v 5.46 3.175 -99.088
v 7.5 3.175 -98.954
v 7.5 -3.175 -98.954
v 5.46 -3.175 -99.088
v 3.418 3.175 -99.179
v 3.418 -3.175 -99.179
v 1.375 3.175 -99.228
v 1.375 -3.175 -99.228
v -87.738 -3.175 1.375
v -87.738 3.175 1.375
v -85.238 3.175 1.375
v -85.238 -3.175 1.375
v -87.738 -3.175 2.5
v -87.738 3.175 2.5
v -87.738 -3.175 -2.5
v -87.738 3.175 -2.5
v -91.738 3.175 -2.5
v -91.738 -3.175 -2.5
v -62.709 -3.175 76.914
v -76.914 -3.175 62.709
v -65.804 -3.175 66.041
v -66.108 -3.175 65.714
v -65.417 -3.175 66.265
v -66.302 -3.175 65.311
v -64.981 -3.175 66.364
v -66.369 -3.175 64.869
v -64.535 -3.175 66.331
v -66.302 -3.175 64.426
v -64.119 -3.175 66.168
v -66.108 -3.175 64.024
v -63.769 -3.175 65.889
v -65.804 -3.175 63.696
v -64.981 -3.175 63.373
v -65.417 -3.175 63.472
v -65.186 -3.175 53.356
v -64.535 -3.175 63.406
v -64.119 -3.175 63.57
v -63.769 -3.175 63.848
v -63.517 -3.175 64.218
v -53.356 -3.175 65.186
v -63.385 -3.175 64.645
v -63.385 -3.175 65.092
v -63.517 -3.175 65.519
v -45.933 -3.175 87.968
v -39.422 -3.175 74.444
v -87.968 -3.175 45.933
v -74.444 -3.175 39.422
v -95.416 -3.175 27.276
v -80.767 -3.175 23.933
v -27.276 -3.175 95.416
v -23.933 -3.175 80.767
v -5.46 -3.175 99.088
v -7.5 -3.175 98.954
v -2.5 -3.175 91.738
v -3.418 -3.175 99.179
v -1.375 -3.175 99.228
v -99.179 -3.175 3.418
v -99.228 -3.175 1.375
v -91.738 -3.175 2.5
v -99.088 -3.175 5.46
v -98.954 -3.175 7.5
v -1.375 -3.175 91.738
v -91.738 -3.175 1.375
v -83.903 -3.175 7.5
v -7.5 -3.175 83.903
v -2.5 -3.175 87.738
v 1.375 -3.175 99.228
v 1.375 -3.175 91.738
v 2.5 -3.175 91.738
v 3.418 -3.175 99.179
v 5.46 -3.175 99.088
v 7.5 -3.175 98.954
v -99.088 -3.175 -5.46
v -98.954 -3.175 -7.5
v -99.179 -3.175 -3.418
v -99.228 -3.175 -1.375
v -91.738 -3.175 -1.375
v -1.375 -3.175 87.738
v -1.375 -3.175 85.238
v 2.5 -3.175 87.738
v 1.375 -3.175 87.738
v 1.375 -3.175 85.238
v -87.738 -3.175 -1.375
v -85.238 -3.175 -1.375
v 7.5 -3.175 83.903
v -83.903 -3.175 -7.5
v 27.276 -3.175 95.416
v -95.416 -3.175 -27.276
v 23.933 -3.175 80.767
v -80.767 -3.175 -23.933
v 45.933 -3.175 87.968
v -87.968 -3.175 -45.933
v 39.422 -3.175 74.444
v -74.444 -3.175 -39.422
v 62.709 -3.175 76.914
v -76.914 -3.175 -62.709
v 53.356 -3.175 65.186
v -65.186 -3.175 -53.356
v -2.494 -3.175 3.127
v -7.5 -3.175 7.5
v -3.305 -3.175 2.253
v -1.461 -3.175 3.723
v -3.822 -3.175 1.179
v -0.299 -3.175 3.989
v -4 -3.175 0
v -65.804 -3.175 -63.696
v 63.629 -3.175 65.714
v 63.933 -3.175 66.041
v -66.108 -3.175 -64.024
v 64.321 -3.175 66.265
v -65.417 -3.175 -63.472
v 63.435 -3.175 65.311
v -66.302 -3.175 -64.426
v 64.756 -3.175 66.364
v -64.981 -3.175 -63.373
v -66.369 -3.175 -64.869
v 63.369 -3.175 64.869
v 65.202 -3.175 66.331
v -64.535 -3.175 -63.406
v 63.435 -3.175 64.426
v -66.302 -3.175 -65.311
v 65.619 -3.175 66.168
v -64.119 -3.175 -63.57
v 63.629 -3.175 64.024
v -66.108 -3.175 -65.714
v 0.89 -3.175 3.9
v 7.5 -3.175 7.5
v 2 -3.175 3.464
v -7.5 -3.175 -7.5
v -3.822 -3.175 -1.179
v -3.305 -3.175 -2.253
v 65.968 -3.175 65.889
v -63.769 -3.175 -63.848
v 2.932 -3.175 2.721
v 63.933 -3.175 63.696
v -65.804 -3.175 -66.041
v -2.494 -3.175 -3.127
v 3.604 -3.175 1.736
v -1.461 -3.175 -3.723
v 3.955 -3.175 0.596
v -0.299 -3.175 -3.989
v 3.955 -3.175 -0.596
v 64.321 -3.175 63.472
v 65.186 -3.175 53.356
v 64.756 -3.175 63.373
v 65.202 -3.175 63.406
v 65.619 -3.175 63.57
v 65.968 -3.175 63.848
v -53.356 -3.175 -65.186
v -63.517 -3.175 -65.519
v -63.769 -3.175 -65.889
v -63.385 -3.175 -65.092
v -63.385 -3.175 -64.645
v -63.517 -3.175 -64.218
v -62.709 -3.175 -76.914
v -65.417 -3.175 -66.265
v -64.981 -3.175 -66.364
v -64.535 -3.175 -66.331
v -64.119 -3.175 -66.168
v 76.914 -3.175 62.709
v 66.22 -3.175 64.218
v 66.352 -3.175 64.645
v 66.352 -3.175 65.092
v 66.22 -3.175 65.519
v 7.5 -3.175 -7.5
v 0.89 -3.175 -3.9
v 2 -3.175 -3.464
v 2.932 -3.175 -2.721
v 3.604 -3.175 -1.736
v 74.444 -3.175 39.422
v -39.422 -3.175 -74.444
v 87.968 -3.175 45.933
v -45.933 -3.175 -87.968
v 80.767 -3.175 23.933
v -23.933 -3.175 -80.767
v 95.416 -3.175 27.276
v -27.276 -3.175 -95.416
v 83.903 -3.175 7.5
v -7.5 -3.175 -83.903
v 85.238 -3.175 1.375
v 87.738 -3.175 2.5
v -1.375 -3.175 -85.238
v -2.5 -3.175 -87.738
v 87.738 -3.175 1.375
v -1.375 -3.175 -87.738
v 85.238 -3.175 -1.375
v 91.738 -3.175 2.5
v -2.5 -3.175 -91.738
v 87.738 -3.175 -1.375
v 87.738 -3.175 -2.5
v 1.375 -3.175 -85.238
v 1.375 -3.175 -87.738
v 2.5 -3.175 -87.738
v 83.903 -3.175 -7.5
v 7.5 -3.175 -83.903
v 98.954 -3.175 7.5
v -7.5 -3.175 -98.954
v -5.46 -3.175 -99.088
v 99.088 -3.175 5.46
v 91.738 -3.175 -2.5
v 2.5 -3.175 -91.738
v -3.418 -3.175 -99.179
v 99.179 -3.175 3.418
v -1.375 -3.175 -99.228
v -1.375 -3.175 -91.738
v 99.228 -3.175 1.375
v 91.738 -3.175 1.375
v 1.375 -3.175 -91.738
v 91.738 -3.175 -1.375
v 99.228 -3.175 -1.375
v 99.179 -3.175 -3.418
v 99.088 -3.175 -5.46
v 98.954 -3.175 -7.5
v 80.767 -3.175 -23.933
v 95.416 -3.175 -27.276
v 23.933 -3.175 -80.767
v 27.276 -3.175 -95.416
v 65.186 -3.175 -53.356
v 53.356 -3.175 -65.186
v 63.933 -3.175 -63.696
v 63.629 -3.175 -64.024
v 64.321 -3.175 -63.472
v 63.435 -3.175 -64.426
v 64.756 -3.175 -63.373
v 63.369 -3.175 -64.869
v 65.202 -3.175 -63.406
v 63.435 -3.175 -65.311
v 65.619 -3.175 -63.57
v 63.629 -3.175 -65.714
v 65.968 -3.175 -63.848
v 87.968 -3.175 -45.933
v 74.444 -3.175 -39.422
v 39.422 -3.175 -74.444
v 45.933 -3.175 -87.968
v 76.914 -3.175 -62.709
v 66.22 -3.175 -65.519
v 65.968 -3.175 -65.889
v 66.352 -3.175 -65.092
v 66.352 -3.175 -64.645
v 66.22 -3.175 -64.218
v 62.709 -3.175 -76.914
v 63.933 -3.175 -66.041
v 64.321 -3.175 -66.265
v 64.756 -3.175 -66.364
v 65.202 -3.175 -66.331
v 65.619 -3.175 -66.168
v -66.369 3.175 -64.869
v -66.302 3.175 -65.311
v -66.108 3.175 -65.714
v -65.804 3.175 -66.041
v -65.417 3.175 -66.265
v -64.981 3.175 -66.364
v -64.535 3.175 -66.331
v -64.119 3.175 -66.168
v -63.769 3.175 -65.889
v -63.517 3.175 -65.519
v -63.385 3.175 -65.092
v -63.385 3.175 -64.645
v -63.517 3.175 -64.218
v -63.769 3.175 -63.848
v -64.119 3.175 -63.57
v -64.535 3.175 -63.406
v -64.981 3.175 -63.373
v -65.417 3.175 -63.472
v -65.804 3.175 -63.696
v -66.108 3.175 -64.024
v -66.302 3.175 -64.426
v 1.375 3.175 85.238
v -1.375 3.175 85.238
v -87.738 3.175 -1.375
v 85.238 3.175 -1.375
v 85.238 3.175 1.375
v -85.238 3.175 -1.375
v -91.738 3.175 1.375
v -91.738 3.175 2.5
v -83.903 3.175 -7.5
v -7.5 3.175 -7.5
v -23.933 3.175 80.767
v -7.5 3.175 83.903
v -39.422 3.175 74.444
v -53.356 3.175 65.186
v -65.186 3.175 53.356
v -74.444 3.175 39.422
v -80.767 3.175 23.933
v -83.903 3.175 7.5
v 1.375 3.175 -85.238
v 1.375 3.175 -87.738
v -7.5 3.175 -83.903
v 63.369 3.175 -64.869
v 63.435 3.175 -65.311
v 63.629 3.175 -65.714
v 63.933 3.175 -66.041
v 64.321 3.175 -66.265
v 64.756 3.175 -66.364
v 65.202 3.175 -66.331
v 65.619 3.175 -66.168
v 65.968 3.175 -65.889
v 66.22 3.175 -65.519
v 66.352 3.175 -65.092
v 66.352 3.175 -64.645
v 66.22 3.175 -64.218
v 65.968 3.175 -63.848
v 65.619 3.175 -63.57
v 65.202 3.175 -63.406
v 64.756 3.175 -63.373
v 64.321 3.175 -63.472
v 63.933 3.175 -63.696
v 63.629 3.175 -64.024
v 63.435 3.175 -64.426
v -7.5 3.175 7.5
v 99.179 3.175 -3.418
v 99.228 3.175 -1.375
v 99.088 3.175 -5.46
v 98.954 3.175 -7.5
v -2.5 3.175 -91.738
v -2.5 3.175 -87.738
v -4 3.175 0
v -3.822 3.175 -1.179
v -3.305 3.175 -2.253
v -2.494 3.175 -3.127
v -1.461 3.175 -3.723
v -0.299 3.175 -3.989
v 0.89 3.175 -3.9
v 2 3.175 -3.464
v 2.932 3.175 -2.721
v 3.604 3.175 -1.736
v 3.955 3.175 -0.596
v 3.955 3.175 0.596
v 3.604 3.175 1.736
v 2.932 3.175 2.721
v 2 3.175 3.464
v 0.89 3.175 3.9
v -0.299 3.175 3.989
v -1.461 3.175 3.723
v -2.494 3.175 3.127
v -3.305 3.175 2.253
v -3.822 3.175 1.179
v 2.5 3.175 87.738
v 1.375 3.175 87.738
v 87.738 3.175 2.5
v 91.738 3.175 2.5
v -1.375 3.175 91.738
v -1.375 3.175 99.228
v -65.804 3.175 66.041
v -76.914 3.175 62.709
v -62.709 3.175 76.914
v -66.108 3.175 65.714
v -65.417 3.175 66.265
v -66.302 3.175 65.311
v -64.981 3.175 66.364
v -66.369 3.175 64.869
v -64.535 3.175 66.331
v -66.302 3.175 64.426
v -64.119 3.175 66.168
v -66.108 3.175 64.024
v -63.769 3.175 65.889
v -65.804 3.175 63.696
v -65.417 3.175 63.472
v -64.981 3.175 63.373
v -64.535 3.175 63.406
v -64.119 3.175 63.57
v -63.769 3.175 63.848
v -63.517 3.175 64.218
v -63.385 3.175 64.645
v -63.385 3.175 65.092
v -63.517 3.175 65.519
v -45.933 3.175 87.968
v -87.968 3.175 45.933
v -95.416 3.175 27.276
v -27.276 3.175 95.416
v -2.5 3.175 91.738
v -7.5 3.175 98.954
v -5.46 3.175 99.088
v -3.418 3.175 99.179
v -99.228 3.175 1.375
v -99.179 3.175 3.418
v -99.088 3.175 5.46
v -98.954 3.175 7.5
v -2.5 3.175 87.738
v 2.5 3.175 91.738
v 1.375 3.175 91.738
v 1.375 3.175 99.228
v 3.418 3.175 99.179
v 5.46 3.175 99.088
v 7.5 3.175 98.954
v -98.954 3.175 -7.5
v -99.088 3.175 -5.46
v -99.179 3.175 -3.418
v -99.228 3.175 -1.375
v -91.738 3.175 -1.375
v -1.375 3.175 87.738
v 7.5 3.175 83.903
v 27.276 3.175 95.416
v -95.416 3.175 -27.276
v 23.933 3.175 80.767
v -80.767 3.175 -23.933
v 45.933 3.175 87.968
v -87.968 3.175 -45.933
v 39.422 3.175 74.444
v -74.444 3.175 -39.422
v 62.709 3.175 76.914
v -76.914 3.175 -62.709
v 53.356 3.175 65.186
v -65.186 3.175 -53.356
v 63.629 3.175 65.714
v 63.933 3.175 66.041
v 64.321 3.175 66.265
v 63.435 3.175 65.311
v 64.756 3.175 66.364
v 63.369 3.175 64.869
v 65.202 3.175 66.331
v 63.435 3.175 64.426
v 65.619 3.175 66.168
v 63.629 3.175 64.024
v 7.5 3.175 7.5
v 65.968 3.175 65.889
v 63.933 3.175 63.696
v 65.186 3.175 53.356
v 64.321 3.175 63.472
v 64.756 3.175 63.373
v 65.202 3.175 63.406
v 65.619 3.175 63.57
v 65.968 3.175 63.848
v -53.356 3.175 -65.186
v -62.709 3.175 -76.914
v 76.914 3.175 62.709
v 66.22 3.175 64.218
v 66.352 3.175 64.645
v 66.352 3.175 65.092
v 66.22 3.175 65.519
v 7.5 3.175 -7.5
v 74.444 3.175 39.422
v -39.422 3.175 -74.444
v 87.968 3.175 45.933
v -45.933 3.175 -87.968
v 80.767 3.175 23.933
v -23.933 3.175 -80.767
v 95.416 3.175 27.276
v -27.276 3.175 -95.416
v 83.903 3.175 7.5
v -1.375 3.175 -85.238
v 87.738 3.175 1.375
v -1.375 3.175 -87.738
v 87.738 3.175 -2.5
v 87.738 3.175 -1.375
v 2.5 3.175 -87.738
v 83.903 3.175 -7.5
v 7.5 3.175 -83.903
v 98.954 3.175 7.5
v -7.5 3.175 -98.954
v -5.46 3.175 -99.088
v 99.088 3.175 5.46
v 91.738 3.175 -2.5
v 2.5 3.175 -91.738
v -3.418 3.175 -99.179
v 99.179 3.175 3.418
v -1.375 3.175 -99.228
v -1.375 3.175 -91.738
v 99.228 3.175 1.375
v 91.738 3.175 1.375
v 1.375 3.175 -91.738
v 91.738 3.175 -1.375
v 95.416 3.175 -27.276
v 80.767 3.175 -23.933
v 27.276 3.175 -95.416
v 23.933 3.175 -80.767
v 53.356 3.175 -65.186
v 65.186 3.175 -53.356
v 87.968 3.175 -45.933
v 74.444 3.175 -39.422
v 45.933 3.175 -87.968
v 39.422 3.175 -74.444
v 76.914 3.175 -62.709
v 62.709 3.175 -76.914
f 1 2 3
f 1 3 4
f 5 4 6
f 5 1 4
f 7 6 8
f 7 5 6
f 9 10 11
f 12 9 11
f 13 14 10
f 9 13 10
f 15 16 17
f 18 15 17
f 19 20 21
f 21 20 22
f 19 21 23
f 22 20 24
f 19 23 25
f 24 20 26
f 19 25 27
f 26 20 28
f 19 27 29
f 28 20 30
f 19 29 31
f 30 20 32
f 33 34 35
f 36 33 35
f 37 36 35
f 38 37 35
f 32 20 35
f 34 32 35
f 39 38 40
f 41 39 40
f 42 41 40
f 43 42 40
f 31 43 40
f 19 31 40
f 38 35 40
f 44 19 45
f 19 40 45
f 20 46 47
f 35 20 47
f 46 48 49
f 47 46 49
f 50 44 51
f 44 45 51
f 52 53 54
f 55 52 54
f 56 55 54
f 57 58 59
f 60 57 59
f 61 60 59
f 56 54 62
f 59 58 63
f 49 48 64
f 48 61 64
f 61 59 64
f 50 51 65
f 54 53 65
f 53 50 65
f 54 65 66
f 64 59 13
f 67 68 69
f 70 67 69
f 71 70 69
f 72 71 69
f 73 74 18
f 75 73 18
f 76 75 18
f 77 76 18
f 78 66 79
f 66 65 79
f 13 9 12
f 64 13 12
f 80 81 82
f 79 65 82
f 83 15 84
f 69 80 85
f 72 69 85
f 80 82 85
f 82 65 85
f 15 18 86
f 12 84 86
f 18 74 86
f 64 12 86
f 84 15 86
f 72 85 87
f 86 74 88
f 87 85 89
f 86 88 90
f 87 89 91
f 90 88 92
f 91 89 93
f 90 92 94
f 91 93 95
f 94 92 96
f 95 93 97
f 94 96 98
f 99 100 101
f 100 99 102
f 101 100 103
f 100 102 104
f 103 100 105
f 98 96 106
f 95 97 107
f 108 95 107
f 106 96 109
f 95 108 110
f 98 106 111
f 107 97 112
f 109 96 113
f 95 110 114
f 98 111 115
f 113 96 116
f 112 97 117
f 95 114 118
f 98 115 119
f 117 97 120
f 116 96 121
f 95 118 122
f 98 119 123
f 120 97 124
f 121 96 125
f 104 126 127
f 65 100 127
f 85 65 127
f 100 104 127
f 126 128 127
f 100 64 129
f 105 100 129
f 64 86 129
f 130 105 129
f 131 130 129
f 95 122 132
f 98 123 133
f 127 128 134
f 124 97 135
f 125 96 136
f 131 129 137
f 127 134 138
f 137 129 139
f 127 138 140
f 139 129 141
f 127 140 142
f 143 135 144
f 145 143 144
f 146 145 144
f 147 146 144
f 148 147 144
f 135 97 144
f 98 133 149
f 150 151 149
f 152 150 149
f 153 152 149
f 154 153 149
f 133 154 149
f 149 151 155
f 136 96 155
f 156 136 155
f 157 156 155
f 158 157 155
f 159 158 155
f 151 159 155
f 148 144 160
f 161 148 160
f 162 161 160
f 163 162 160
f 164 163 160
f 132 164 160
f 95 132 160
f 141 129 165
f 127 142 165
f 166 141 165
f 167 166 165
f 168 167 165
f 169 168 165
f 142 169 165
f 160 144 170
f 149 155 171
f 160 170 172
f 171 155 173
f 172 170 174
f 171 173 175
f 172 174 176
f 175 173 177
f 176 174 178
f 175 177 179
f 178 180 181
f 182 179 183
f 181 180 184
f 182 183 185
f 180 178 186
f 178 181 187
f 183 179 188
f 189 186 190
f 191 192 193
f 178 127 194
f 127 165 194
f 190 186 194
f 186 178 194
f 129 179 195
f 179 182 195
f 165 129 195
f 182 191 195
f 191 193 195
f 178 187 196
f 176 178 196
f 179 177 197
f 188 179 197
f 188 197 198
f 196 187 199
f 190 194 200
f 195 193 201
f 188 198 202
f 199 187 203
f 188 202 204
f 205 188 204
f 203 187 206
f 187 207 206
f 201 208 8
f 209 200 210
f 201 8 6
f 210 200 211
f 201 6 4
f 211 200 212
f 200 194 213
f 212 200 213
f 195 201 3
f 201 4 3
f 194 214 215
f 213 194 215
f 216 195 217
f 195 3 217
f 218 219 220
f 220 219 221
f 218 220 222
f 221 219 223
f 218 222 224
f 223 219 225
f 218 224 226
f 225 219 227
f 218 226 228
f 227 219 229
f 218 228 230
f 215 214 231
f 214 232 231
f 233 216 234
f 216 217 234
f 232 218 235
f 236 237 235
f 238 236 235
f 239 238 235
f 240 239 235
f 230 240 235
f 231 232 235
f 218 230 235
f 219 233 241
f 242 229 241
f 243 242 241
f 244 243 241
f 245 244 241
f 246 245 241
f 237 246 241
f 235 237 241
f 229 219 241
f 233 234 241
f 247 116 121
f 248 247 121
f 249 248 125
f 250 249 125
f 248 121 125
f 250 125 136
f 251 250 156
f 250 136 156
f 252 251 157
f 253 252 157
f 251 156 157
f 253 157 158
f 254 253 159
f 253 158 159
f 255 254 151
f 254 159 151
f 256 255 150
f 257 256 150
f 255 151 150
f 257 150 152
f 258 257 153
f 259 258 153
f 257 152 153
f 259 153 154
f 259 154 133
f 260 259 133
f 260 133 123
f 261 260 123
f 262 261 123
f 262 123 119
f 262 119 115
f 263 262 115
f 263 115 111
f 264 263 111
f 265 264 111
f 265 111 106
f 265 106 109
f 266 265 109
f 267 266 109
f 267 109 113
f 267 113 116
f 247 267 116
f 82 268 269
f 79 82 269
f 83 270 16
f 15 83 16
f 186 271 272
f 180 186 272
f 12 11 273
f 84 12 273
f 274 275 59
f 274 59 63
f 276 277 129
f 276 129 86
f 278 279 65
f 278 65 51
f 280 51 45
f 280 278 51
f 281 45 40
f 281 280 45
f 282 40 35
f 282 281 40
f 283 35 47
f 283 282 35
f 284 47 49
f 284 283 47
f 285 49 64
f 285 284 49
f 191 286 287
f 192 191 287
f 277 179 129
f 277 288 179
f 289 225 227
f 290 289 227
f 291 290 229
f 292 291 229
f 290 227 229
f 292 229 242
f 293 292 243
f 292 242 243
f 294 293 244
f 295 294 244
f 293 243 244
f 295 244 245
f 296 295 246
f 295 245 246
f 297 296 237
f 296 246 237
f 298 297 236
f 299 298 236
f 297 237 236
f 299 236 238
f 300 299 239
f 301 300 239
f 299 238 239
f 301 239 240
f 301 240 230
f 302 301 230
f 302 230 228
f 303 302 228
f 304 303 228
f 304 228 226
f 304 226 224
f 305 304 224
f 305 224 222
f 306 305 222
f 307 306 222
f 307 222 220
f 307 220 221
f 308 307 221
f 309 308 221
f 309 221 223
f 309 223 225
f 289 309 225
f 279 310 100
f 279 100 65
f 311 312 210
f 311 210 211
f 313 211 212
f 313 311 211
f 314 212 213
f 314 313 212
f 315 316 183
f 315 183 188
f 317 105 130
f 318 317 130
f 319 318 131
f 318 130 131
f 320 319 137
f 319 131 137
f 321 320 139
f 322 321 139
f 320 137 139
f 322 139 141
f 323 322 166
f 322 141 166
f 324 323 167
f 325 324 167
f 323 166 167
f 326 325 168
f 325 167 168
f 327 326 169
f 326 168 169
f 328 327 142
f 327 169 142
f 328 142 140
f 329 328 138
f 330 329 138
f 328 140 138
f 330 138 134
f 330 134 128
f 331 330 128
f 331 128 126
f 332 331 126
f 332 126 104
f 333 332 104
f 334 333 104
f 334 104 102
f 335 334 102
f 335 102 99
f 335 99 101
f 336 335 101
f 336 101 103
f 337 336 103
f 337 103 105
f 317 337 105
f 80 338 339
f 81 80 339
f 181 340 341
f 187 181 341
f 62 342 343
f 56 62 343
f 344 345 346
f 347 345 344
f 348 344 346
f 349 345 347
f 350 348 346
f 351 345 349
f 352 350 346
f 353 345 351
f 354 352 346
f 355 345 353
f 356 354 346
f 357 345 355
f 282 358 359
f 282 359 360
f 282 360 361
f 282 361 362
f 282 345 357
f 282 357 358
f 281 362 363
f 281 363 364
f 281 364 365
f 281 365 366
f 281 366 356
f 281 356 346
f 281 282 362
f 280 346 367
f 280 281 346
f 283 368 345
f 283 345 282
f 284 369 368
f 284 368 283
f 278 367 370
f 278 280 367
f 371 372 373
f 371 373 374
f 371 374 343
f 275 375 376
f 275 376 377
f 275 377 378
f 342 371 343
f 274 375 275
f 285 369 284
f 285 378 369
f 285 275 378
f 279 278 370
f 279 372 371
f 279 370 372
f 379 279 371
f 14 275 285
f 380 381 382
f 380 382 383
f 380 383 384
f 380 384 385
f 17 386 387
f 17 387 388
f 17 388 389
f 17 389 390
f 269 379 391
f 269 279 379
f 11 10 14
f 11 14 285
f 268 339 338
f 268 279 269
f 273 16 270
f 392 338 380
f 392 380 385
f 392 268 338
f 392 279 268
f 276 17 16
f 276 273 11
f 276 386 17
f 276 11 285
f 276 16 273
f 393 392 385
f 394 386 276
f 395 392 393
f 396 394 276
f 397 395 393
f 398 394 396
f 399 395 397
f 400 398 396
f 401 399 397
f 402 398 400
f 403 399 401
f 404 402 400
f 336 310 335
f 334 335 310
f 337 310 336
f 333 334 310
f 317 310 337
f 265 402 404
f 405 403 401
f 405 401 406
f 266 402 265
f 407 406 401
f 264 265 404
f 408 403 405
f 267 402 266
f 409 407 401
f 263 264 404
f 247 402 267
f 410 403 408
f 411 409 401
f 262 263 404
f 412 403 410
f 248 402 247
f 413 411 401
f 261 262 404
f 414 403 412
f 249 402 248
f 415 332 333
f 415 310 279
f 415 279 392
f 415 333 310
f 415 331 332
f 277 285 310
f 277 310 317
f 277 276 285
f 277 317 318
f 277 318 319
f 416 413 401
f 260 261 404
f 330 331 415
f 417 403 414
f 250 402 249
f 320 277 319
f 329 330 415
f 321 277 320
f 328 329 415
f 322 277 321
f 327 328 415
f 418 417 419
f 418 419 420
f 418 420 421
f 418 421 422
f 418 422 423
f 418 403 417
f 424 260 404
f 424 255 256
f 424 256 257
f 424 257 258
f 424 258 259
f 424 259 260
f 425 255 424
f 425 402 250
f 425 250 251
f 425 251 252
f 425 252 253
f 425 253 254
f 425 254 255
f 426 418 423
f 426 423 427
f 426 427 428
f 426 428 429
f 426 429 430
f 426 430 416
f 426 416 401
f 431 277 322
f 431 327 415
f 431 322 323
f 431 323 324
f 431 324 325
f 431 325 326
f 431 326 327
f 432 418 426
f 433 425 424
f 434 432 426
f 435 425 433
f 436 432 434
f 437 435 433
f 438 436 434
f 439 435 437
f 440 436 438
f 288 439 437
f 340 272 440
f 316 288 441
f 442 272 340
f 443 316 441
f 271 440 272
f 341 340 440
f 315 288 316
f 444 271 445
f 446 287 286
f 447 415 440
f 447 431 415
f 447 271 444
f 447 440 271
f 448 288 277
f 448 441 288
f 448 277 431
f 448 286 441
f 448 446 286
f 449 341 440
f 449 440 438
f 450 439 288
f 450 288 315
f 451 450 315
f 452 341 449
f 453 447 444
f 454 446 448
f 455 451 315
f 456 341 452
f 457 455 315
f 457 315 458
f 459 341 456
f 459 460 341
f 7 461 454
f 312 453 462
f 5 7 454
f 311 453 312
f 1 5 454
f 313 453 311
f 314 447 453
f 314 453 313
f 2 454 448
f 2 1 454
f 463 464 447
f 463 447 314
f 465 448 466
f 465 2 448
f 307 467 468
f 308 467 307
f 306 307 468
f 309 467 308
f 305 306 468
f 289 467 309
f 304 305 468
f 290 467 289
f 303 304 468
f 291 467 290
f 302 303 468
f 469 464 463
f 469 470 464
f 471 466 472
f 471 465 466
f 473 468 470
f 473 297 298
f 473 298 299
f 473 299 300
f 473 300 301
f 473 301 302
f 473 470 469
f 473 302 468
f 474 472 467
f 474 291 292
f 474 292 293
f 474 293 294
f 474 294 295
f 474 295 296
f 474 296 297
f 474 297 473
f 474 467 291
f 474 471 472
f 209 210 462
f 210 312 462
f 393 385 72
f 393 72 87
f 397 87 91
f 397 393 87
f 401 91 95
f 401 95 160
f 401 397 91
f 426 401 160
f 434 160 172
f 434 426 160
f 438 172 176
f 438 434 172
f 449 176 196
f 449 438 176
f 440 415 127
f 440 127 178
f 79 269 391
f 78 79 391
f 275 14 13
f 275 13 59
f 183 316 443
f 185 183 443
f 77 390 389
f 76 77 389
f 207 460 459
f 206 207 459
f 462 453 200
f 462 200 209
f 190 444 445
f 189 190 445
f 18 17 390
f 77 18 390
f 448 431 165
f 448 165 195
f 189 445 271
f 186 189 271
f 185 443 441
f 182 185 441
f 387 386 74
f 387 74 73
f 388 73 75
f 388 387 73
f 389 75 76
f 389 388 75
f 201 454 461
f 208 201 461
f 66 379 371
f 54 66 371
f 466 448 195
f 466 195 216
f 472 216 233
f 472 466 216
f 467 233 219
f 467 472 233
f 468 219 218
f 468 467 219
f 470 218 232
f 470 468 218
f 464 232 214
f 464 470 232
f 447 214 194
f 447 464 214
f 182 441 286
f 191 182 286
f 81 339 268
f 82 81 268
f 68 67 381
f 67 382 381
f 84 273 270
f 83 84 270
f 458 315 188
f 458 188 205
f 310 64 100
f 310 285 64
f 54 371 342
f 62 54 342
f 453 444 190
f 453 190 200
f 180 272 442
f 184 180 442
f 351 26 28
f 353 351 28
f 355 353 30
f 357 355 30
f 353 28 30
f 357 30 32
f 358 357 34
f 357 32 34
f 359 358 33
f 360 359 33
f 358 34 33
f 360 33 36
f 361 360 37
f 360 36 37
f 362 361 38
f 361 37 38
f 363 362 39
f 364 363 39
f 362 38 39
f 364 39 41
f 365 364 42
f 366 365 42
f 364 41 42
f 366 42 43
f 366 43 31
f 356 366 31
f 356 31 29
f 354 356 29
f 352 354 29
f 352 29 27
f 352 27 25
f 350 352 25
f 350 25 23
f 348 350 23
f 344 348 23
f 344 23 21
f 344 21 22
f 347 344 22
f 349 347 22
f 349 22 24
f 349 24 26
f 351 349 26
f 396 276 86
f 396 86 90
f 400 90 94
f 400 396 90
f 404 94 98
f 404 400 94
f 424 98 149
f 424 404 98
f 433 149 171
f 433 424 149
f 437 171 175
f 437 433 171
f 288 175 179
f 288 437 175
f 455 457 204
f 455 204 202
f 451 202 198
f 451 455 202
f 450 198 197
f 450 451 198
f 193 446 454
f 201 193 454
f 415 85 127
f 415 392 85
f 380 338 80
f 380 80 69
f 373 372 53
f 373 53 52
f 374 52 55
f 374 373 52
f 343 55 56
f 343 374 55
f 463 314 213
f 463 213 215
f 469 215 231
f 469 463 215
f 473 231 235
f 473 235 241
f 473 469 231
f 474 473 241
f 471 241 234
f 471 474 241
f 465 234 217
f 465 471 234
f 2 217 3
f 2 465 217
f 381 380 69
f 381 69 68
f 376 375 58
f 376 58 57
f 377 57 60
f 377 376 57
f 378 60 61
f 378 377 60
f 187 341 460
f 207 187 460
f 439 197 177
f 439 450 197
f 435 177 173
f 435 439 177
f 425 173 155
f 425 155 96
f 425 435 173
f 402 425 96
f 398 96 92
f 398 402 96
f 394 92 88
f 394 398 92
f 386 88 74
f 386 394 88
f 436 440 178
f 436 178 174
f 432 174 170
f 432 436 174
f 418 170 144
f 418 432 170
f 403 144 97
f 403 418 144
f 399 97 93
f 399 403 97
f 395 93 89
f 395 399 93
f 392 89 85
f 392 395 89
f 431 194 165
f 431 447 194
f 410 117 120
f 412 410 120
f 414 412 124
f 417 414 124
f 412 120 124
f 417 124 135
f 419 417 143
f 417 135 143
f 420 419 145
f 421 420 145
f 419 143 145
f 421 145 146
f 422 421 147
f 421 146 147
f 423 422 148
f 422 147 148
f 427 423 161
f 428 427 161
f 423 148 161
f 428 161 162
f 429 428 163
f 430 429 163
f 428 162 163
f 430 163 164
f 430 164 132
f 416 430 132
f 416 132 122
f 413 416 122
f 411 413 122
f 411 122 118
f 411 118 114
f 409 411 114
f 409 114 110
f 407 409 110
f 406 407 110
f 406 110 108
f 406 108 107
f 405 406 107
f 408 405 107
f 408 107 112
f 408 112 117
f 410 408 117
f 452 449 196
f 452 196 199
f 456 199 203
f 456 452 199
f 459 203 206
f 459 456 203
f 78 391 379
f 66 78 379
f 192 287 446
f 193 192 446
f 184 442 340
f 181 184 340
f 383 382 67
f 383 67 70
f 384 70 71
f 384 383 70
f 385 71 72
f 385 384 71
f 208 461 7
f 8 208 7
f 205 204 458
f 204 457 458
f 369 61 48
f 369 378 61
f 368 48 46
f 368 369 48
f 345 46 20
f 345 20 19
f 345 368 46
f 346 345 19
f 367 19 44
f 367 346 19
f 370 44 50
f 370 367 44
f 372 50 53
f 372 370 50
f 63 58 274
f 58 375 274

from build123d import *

# Parameters (mm, degrees)
SKETCH1_W                    = 15
SKETCH1_H                    = 15
BOSS_EXTRUDE1_DEPTH          = 3.175
SKETCH2_W                    = 2.75
SKETCH2_H                    = 2.5
SKETCH2_H_2                  = 4
SKETCH2_W_2                  = 1.125
SKETCH2_H_3                  = 7.5
CUT_EXTRUDE1_DEPTH           = 141.379634965
CIRPATTERN1_COUNT            = 4
F_3_0_3_DIAMETER_HOLE1_D     = 3
F_8_0_8_DIAMETER_HOLE1_D     = 8
F_8_0_8_DIAMETER_HOLE1_DEPTH = 6.35


with BuildPart() as part:
    # Sketch1 → Boss-Extrude1 (new, symmetric)
    with BuildSketch(Plane(origin=(0, 0, 0), x_dir=(1, 0, 0), z_dir=(0, 1, 0))):
        with BuildLine():
            Line((-83.903460262, -7.5), (-98.95418457, -7.5))
            ThreePointArc((-98.95418457, -7.5), (-70.171862751, -70.171862751), (-7.5, -98.95418457))
            Line((-7.5, -98.95418457), (-7.5, -83.903460262))
            ThreePointArc((-7.5, -83.903460262), (-59.565261034, -59.565261034), (-83.903460262, -7.5))
        make_face()
        with BuildLine():
            ThreePointArc((-98.95418457, 7.5), (-99.238, 0), (-98.95418457, -7.5))
            Line((-98.95418457, -7.5), (-83.903460262, -7.5))
            ThreePointArc((-83.903460262, -7.5), (-84.238, 0), (-83.903460262, 7.5))
            Line((-83.903460262, 7.5), (-98.95418457, 7.5))
        make_face()
        with BuildLine():
            Line((83.903460262, -7.5), (98.95418457, -7.5))
            ThreePointArc((98.95418457, -7.5), (99.167020759, -3.752684079), (99.238, 0))
            ThreePointArc((99.238, 0), (99.167020759, 3.752684079), (98.95418457, 7.5))
            Line((98.95418457, 7.5), (83.903460262, 7.5))
            ThreePointArc((83.903460262, 7.5), (84.154323506, 3.753728707), (84.238, 0))
            ThreePointArc((84.238, 0), (84.154323506, -3.753728707), (83.903460262, -7.5))
        make_face()
        with BuildLine():
            ThreePointArc((-7.5, 98.95418457), (-70.171862751, 70.171862751), (-98.95418457, 7.5))
            Line((-98.95418457, 7.5), (-83.903460262, 7.5))
            ThreePointArc((-83.903460262, 7.5), (-59.565261034, 59.565261034), (-7.5, 83.903460262))
            Line((-7.5, 83.903460262), (-7.5, 98.95418457))
        make_face()
        with BuildLine():
            Line((-7.5, -83.903460262), (-7.5, -98.95418457))
            ThreePointArc((-7.5, -98.95418457), (0, -99.238), (7.5, -98.95418457))
            Line((7.5, -98.95418457), (7.5, -83.903460262))
            ThreePointArc((7.5, -83.903460262), (0, -84.238), (-7.5, -83.903460262))
        make_face()
        with BuildLine():
            ThreePointArc((7.5, 98.95418457), (0, 99.238), (-7.5, 98.95418457))
            Line((-7.5, 98.95418457), (-7.5, 83.903460262))
            ThreePointArc((-7.5, 83.903460262), (0, 84.238), (7.5, 83.903460262))
            Line((7.5, 83.903460262), (7.5, 98.95418457))
        make_face()
        with BuildLine():
            ThreePointArc((98.95418457, 7.5), (70.171862751, 70.171862751), (7.5, 98.95418457))
            Line((7.5, 98.95418457), (7.5, 83.903460262))
            ThreePointArc((7.5, 83.903460262), (59.565261034, 59.565261034), (83.903460262, 7.5))
            Line((83.903460262, 7.5), (98.95418457, 7.5))
        make_face()
        with BuildLine():
            Line((7.5, -83.903460262), (7.5, -98.95418457))
            ThreePointArc((7.5, -98.95418457), (70.171862751, -70.171862751), (98.95418457, -7.5))
            Line((98.95418457, -7.5), (83.903460262, -7.5))
            ThreePointArc((83.903460262, -7.5), (59.565261034, -59.565261034), (7.5, -83.903460262))
        make_face()
        with BuildLine():
            Line((7.5, -7.5), (-7.5, -7.5))
            Line((-7.5, -7.5), (-7.5, -83.903460262))
            ThreePointArc((-7.5, -83.903460262), (0, -84.238), (7.5, -83.903460262))
            Line((7.5, -83.903460262), (7.5, -7.5))
        make_face()
        with BuildLine():
            ThreePointArc((-83.903460262, 7.5), (-84.238, 0), (-83.903460262, -7.5))
            Line((-83.903460262, -7.5), (-7.5, -7.5))
            Line((-7.5, -7.5), (-7.5, 7.5))
            Line((-7.5, 7.5), (-83.903460262, 7.5))
        make_face()
        with BuildLine():
            Line((-7.5, 83.903460262), (-7.5, 7.5))
            Line((-7.5, 7.5), (7.5, 7.5))
            Line((7.5, 7.5), (7.5, 83.903460262))
            ThreePointArc((7.5, 83.903460262), (0, 84.238), (-7.5, 83.903460262))
        make_face()
        with BuildLine():
            Line((7.5, 7.5), (7.5, -7.5))
            Line((7.5, -7.5), (83.903460262, -7.5))
            ThreePointArc((83.903460262, -7.5), (84.154323506, -3.753728707), (84.238, 0))
            ThreePointArc((84.238, 0), (84.154323506, 3.753728707), (83.903460262, 7.5))
            Line((83.903460262, 7.5), (7.5, 7.5))
        make_face()
        Rectangle(SKETCH1_W, SKETCH1_H)
    extrude(amount=BOSS_EXTRUDE1_DEPTH, both=True)

    # Sketch2 → Cut-Extrude1 (cut, symmetric)
    with BuildSketch(Plane(origin=(0, 0, 0), x_dir=(1, 0, 0), z_dir=(0, 1, 0))):
        with Locations((0, 86.488)):
            Rectangle(SKETCH2_W, SKETCH2_H)
        with Locations((0, 89.738)):
            Rectangle(SKETCH2_W, SKETCH2_H_2)
        with Locations((1.9375, 89.738)):
            Rectangle(SKETCH2_W_2, SKETCH2_H_2)
        with Locations((0, 95.488)):
            Rectangle(SKETCH2_W, SKETCH2_H_3)
        with Locations((-1.9375, 89.738)):
            Rectangle(SKETCH2_W_2, SKETCH2_H_2)
    cut_extrude1 = extrude(amount=CUT_EXTRUDE1_DEPTH, both=True, mode=Mode.SUBTRACT)

    # CirPattern1: Cut-Extrude1 ×4 about axis
    cirpattern1_axis = Axis((0, 0, 0), (0, 1, 0))
    for i in range(1, CIRPATTERN1_COUNT):
        add(cut_extrude1.rotate(cirpattern1_axis, i * 360 / CIRPATTERN1_COUNT), mode=Mode.SUBTRACT)

    # Ø3.0 (3) Diameter Hole1 (through all)
    with Locations(Plane(origin=(0, 3.175, 0), x_dir=(1, 0, 0), z_dir=(0, 1, 0))):
        with Locations((-64.868561892, -64.868561892), (0, 0), (-64.868561892, 64.868561892), (64.868561892, 64.868561892), (64.868561892, -64.868561892)):
            Hole(F_3_0_3_DIAMETER_HOLE1_D / 2)

    # Ø8.0 (8) Diameter Hole1
    with Locations(Plane(origin=(0, 3.175, 0), x_dir=(1, 0, 0), z_dir=(0, 1, 0))):
        with Locations((0, 0)):
            Hole(F_8_0_8_DIAMETER_HOLE1_D / 2, depth=F_8_0_8_DIAMETER_HOLE1_DEPTH)


solid = part.part
